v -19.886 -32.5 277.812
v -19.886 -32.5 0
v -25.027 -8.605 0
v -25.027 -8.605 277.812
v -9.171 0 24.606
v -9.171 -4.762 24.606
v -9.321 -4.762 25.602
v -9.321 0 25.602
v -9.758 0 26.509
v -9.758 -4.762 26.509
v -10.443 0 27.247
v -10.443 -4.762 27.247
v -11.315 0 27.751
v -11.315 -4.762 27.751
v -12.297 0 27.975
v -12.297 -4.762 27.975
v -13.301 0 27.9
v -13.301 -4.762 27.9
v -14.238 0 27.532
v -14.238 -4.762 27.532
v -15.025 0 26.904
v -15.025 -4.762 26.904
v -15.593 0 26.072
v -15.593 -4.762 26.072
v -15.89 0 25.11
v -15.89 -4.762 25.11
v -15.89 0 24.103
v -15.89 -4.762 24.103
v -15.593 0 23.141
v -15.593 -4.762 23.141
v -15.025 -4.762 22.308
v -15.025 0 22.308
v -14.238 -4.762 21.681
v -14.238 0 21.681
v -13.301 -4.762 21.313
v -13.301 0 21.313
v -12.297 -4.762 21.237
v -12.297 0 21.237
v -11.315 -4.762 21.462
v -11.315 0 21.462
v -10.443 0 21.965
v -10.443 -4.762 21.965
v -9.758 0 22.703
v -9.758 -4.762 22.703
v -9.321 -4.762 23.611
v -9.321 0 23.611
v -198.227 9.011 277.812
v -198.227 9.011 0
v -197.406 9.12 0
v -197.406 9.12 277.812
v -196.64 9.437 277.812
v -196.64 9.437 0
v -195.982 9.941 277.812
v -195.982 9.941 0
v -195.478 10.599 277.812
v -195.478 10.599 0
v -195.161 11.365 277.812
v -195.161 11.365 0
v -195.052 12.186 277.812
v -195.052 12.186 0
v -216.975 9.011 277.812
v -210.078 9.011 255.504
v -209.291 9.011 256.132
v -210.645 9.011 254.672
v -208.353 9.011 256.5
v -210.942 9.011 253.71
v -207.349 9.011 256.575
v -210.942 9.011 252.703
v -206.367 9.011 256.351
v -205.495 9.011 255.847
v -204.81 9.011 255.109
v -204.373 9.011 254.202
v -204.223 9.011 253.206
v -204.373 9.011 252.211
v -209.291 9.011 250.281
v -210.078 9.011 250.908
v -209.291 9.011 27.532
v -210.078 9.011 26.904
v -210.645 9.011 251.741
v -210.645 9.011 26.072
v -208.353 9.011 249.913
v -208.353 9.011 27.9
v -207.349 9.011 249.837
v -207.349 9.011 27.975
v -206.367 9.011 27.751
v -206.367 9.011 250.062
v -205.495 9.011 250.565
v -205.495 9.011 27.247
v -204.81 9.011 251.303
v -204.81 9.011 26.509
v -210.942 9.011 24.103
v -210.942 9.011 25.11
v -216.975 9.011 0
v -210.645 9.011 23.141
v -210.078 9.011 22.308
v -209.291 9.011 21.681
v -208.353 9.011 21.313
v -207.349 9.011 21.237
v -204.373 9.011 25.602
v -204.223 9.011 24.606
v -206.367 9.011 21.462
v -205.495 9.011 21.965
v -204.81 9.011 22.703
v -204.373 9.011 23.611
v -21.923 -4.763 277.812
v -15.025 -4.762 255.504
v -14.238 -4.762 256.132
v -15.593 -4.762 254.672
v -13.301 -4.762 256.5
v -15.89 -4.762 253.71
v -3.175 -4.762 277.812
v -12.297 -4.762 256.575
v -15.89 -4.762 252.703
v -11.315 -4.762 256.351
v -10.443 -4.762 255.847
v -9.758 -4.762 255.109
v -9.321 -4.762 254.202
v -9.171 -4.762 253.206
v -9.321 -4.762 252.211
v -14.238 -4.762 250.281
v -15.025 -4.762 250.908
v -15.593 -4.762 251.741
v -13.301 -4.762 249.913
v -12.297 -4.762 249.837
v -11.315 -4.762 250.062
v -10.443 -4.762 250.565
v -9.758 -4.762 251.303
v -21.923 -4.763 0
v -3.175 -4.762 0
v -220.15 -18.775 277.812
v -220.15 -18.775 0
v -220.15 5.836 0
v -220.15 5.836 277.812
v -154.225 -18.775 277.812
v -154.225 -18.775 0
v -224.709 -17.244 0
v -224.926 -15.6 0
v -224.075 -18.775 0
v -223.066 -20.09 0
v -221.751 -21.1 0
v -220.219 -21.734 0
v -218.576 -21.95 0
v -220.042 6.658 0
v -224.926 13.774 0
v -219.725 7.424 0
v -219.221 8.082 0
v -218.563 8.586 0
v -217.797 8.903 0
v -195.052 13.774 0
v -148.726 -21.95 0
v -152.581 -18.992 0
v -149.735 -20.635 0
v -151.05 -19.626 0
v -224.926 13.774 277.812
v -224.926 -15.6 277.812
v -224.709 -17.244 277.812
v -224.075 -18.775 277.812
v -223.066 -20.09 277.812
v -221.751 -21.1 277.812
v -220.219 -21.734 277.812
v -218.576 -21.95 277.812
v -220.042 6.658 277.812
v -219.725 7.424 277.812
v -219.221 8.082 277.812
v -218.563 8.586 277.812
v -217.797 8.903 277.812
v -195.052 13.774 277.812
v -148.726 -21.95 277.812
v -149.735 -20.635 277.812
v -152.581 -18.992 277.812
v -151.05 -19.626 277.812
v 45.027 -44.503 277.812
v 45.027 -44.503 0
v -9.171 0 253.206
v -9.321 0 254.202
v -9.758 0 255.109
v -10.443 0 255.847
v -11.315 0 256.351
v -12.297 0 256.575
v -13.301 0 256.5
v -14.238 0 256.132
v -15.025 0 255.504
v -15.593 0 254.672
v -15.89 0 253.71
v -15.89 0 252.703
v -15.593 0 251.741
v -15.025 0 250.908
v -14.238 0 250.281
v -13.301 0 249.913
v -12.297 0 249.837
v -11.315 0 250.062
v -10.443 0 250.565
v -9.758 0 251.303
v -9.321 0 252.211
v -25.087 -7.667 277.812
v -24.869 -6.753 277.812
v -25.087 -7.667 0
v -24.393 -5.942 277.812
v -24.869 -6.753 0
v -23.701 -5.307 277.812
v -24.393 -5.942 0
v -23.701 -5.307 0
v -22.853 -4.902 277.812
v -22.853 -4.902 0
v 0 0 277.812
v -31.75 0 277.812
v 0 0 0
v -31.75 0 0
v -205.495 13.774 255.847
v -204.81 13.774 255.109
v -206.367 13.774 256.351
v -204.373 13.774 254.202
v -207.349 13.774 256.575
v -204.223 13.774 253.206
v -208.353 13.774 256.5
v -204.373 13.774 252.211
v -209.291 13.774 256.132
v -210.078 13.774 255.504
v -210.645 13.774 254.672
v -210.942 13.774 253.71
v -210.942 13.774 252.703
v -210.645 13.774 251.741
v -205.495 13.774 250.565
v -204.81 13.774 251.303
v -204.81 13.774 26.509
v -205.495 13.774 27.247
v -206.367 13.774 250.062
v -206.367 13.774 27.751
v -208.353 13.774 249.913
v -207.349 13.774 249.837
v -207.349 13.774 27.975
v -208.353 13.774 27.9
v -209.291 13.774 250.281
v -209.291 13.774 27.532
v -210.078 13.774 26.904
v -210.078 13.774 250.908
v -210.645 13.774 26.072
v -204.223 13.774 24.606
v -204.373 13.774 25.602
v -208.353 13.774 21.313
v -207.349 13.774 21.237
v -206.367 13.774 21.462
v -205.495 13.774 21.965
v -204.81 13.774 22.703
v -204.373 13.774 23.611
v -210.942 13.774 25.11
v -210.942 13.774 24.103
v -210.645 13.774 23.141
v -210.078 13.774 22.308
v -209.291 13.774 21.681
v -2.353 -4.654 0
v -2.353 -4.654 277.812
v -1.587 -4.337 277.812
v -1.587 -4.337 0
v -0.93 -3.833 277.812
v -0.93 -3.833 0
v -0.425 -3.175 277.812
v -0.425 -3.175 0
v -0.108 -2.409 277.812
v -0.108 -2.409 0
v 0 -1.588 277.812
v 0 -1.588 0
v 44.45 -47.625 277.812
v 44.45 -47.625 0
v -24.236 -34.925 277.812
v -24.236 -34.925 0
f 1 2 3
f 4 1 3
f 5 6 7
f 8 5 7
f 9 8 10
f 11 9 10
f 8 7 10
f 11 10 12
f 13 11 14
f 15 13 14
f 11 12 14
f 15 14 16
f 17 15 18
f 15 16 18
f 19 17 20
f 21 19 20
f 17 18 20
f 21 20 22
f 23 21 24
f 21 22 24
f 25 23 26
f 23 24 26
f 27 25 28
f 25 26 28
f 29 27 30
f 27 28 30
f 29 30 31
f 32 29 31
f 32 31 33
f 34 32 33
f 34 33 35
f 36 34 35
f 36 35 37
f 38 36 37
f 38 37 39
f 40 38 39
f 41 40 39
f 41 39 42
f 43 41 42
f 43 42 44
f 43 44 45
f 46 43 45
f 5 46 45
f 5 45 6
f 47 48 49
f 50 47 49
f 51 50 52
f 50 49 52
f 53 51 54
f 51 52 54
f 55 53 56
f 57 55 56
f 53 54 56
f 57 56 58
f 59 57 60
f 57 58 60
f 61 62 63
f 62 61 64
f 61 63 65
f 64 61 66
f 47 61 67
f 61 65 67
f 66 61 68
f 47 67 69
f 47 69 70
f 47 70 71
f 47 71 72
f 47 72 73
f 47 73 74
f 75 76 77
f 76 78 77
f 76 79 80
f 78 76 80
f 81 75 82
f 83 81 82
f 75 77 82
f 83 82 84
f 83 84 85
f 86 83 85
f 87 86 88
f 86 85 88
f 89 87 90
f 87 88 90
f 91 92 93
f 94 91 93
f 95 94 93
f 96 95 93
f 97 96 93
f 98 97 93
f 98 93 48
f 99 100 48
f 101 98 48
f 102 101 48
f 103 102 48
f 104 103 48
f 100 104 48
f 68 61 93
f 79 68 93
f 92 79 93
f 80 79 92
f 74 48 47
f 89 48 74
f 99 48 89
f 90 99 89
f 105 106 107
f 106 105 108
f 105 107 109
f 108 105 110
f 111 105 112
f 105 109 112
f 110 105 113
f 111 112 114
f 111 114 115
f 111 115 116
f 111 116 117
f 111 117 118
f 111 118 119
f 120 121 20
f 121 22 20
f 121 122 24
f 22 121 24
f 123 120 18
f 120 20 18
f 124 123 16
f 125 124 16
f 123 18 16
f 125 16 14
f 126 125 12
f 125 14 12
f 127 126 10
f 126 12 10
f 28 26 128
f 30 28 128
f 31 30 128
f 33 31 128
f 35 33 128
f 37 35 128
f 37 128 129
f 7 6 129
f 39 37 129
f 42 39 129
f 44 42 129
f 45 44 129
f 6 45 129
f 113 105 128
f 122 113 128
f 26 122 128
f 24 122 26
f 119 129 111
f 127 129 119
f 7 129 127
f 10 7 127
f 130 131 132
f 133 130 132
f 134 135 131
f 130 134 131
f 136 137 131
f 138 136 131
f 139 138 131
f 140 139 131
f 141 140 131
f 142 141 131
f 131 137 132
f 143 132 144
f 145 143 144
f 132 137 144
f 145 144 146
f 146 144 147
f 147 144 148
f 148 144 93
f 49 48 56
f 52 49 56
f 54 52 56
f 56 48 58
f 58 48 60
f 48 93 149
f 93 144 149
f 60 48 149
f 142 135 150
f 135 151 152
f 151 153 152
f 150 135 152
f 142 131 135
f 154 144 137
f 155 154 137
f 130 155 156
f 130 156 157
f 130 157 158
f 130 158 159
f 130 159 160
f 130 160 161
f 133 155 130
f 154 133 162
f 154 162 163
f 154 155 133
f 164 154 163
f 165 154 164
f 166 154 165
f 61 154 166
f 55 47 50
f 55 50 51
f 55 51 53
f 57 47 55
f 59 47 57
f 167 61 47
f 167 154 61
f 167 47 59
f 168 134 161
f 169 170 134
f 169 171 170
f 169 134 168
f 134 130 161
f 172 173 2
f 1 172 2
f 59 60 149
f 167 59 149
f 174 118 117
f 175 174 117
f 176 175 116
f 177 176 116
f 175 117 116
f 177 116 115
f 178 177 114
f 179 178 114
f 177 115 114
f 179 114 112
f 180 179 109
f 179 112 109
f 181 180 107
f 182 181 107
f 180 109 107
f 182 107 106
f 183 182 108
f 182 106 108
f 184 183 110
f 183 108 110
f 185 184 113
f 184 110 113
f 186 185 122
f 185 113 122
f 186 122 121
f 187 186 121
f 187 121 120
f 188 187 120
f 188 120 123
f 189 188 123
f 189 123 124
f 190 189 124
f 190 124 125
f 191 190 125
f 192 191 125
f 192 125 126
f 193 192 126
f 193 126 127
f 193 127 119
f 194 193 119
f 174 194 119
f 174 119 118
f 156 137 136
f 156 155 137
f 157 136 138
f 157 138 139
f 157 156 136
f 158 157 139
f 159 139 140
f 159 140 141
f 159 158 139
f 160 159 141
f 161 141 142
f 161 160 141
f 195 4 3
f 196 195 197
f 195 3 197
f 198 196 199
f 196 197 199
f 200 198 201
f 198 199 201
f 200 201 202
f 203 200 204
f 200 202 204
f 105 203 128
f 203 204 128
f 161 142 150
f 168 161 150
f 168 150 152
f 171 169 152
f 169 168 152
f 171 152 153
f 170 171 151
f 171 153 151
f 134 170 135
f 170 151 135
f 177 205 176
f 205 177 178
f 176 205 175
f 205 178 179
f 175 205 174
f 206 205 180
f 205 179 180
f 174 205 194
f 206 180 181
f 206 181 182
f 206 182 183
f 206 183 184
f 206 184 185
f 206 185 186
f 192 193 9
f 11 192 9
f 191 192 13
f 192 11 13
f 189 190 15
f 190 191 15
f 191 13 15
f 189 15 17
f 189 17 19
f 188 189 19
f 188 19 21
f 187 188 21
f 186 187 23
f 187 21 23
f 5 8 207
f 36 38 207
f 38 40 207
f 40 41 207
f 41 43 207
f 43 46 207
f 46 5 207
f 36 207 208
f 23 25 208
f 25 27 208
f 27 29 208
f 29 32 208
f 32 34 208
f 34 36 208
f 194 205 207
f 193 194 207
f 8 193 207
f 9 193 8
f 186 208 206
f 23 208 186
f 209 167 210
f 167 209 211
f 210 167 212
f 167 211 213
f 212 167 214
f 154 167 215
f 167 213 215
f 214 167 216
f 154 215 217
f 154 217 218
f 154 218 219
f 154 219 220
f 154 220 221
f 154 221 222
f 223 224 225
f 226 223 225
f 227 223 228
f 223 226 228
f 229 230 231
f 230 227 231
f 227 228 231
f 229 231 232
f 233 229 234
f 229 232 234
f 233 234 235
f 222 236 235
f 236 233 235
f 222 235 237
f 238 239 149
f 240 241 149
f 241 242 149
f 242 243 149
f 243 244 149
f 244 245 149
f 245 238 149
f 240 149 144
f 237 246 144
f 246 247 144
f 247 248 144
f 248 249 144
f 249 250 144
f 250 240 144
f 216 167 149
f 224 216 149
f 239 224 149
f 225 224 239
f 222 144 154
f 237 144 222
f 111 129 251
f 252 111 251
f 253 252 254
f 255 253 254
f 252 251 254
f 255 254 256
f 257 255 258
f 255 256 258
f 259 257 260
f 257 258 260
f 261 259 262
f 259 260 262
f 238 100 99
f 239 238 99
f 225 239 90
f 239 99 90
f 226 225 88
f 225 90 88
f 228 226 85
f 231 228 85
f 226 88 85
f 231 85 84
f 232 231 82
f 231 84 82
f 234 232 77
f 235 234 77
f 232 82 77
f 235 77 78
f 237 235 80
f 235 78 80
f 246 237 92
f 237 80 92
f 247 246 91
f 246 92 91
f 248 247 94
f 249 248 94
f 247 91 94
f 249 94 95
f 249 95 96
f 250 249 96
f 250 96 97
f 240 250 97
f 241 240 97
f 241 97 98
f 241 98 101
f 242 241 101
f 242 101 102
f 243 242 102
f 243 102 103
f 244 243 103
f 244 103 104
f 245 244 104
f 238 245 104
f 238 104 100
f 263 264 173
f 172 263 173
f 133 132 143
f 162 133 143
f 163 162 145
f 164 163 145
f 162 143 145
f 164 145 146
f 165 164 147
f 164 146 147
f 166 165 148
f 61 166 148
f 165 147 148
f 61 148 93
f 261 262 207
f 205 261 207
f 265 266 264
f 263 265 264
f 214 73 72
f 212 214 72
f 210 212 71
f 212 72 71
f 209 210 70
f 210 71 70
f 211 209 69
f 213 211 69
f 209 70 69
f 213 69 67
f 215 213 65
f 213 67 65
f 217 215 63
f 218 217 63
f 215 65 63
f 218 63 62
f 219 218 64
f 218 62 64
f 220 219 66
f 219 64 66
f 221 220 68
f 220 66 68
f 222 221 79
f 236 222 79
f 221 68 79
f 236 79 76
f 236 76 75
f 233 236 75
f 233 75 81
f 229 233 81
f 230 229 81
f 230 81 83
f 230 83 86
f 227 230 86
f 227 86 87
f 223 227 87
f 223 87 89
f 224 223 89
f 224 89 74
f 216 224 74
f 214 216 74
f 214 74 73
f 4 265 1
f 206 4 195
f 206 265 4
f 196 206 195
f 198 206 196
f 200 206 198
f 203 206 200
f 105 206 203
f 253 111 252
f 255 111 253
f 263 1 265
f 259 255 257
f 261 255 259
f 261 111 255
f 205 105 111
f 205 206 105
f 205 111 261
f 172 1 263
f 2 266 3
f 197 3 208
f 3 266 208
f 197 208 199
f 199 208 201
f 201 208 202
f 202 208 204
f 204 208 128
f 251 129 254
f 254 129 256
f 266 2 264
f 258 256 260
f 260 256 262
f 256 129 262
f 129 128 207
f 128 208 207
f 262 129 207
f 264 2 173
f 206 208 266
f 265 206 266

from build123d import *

# Parameters (mm, degrees)
F1_DEPTH    = 277.8125
F3_D        = 6.7564
F3_DEPTH    = 4.7635
F5_DEPTH    = 277.8125
F7_D        = 6.7564
F7_DEPTH    = 4.7635
F8_R        = 6.35
F9_T1_DEPTH = 305.3088065702


# Not quite as in the source:
# - a fillet or chamfer that OpenCascade refuses, or shapes differently, is made with other operations: its cross-section is extruded or revolved along the edge and cut away or added


with BuildPart() as f1:
    # F0 (on Top) → F1 (new body)
    with BuildSketch(Plane.XY):
        with BuildLine():
            Line((0, -1.5875), (0, 0))
            Line((0, 0), (-31.75, 0))
            Line((-31.75, 0), (-24.2357517976, -34.925))
            Line((-24.2357517976, -34.925), (44.45, -47.625))
            Line((44.45, -47.625), (45.0272727273, -44.5029203728))
            Line((45.0272727273, -44.5029203728), (-19.8859153776, -32.5004676464))
            Line((-19.8859153776, -32.5004676464), (-25.0270460191, -8.6053309912))
            ThreePointArc((-25.0270460191, -8.6053309912), (-24.392994354, -5.9424734835), (-21.9230765014, -4.7625))
            Line((-21.9230765014, -4.7625), (-3.175, -4.7625))
            ThreePointArc((-3.175, -4.7625), (-0.9299359697, -3.8325640303), (0, -1.5875))
        make_face()
    extrude(amount=F1_DEPTH)

    # F3 (through all, one way)
    with BuildSketch(Plane.XZ.offset(4.7625)):
        with Locations((-12.5490382507, 253.20625), (-12.5490382507, 24.60625)):
            Circle(F3_D / 2)
    extrude(amount=-F3_DEPTH, mode=Mode.SUBTRACT)


with BuildPart() as f5:
    # F4 (on Top) → F5 (new body)
    with BuildSketch(Plane.XY):
        with BuildLine():
            Line((-195.0523899696, 12.1864487154), (-195.0523899696, 13.7739487154))
            Line((-195.0523899696, 13.7739487154), (-224.925666471, 13.7739487154))
            Line((-224.925666471, 13.7739487154), (-224.925666471, -21.9502664761))
            Line((-224.925666471, -21.9502664761), (-148.725666471, -21.9502664761))
            Line((-148.725666471, -21.9502664761), (-148.725666471, -18.7752664761))
            Line((-148.725666471, -18.7752664761), (-220.150466471, -18.7752664761))
            Line((-220.150466471, -18.7752664761), (-220.150466471, 5.8364487154))
            ThreePointArc((-220.150466471, 5.8364487154), (-219.2205305013, 8.0815127456), (-216.975466471, 9.0114487154))
            Line((-216.975466471, 9.0114487154), (-198.2273899696, 9.0114487154))
            ThreePointArc((-198.2273899696, 9.0114487154), (-195.9823259393, 9.9413846851), (-195.0523899696, 12.1864487154))
        make_face()
    extrude(amount=F5_DEPTH)

    # F7 (through all, one way)
    with BuildSketch(Plane.XZ.offset(-9.0114487154)):
        with Locations((-207.6014282203, 253.20625), (-207.6014282203, 24.60625)):
            Circle(F7_D / 2)
    extrude(amount=-F7_DEPTH, mode=Mode.SUBTRACT)

    # F8
    f8_edges = [f5.edges().sort_by_distance(p)[0] for p in [
        (-224.925666, -21.950266, 138.90625),
    ]]
    fillet(f8_edges, radius=F8_R)

    # F9: fillet of radius 6.35 on 1 edges, made by hand

    # F9_s2 → F9_t1 (cut)
    with BuildSketch(Plane.XY.offset(-13.7481532851)):
        with BuildLine():
            ThreePointArc((-148.725666471, -21.9502664761), (-151.049927785, -19.6260051621), (-154.224927785, -18.7752664761))
            Line((-154.224927785, -18.7752664761), (-148.725666471, -18.7752664761))
            Line((-148.725666471, -18.7752664761), (-148.725666471, -21.9502664761))
        make_face()
    extrude(amount=F9_T1_DEPTH, mode=Mode.SUBTRACT)


solid = Compound([f1.part, f5.part])
